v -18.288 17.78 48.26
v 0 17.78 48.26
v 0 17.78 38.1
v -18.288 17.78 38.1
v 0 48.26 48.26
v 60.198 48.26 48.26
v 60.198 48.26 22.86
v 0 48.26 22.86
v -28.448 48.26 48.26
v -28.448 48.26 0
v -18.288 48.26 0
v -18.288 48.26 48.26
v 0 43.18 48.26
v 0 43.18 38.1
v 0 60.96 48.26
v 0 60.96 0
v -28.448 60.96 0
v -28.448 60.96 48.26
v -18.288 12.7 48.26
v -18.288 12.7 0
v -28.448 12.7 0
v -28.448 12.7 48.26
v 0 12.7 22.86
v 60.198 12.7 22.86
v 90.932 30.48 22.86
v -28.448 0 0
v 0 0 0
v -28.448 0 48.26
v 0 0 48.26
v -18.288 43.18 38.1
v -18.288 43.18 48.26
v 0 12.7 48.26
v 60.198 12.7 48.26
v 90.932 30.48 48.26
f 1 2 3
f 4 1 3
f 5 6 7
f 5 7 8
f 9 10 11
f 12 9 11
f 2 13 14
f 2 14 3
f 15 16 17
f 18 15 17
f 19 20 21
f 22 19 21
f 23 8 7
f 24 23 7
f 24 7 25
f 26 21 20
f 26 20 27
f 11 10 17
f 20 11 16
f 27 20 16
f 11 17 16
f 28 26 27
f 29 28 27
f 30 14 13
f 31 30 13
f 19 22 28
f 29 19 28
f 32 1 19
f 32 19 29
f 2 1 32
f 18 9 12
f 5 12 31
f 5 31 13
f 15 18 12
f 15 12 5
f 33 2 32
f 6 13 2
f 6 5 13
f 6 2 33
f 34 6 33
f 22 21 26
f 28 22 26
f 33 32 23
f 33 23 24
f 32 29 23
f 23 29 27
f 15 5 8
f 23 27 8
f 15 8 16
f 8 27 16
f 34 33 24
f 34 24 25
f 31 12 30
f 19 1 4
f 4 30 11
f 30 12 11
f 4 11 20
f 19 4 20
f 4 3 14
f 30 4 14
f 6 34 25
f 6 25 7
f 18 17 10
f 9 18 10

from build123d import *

# Parameters (mm, degrees)
F1_DEPTH = 48.26
F3_DEPTH = 18.288
F5_DEPTH = 25.4


with BuildPart() as f1:
    # F0 (on Top) → F1 (new body)
    with BuildSketch(Plane.XY):
        Polygon((-28.448, 0), (0, 0), (0, 30.48), (0, 60.96), (-28.448, 60.96), (-28.448, 48.26), (-18.288, 48.26), (-18.288, 43.18), (-18.288, 30.48), (-18.288, 17.78), (-18.288, 12.7), (-28.448, 12.7), align=None)
    extrude(amount=F1_DEPTH)

    # F2 (on face) → F3 (cut, through all)
    with BuildSketch(Plane.YZ):
        Polygon((17.78, 38.1), (30.48, 38.1), (43.18, 38.1), (43.18, 48.26), (17.78, 48.26), align=None)
    extrude(amount=-F3_DEPTH, mode=Mode.SUBTRACT)

    # F4 (on face) → F5 (join)
    with BuildSketch(Plane.XY.offset(48.26)):
        Polygon((0, 48.26), (0, 30.48), (0, 12.7), (60.198, 12.7), (90.932, 30.48), (60.198, 48.26), align=None)
    extrude(amount=-F5_DEPTH)


solid = f1.part
